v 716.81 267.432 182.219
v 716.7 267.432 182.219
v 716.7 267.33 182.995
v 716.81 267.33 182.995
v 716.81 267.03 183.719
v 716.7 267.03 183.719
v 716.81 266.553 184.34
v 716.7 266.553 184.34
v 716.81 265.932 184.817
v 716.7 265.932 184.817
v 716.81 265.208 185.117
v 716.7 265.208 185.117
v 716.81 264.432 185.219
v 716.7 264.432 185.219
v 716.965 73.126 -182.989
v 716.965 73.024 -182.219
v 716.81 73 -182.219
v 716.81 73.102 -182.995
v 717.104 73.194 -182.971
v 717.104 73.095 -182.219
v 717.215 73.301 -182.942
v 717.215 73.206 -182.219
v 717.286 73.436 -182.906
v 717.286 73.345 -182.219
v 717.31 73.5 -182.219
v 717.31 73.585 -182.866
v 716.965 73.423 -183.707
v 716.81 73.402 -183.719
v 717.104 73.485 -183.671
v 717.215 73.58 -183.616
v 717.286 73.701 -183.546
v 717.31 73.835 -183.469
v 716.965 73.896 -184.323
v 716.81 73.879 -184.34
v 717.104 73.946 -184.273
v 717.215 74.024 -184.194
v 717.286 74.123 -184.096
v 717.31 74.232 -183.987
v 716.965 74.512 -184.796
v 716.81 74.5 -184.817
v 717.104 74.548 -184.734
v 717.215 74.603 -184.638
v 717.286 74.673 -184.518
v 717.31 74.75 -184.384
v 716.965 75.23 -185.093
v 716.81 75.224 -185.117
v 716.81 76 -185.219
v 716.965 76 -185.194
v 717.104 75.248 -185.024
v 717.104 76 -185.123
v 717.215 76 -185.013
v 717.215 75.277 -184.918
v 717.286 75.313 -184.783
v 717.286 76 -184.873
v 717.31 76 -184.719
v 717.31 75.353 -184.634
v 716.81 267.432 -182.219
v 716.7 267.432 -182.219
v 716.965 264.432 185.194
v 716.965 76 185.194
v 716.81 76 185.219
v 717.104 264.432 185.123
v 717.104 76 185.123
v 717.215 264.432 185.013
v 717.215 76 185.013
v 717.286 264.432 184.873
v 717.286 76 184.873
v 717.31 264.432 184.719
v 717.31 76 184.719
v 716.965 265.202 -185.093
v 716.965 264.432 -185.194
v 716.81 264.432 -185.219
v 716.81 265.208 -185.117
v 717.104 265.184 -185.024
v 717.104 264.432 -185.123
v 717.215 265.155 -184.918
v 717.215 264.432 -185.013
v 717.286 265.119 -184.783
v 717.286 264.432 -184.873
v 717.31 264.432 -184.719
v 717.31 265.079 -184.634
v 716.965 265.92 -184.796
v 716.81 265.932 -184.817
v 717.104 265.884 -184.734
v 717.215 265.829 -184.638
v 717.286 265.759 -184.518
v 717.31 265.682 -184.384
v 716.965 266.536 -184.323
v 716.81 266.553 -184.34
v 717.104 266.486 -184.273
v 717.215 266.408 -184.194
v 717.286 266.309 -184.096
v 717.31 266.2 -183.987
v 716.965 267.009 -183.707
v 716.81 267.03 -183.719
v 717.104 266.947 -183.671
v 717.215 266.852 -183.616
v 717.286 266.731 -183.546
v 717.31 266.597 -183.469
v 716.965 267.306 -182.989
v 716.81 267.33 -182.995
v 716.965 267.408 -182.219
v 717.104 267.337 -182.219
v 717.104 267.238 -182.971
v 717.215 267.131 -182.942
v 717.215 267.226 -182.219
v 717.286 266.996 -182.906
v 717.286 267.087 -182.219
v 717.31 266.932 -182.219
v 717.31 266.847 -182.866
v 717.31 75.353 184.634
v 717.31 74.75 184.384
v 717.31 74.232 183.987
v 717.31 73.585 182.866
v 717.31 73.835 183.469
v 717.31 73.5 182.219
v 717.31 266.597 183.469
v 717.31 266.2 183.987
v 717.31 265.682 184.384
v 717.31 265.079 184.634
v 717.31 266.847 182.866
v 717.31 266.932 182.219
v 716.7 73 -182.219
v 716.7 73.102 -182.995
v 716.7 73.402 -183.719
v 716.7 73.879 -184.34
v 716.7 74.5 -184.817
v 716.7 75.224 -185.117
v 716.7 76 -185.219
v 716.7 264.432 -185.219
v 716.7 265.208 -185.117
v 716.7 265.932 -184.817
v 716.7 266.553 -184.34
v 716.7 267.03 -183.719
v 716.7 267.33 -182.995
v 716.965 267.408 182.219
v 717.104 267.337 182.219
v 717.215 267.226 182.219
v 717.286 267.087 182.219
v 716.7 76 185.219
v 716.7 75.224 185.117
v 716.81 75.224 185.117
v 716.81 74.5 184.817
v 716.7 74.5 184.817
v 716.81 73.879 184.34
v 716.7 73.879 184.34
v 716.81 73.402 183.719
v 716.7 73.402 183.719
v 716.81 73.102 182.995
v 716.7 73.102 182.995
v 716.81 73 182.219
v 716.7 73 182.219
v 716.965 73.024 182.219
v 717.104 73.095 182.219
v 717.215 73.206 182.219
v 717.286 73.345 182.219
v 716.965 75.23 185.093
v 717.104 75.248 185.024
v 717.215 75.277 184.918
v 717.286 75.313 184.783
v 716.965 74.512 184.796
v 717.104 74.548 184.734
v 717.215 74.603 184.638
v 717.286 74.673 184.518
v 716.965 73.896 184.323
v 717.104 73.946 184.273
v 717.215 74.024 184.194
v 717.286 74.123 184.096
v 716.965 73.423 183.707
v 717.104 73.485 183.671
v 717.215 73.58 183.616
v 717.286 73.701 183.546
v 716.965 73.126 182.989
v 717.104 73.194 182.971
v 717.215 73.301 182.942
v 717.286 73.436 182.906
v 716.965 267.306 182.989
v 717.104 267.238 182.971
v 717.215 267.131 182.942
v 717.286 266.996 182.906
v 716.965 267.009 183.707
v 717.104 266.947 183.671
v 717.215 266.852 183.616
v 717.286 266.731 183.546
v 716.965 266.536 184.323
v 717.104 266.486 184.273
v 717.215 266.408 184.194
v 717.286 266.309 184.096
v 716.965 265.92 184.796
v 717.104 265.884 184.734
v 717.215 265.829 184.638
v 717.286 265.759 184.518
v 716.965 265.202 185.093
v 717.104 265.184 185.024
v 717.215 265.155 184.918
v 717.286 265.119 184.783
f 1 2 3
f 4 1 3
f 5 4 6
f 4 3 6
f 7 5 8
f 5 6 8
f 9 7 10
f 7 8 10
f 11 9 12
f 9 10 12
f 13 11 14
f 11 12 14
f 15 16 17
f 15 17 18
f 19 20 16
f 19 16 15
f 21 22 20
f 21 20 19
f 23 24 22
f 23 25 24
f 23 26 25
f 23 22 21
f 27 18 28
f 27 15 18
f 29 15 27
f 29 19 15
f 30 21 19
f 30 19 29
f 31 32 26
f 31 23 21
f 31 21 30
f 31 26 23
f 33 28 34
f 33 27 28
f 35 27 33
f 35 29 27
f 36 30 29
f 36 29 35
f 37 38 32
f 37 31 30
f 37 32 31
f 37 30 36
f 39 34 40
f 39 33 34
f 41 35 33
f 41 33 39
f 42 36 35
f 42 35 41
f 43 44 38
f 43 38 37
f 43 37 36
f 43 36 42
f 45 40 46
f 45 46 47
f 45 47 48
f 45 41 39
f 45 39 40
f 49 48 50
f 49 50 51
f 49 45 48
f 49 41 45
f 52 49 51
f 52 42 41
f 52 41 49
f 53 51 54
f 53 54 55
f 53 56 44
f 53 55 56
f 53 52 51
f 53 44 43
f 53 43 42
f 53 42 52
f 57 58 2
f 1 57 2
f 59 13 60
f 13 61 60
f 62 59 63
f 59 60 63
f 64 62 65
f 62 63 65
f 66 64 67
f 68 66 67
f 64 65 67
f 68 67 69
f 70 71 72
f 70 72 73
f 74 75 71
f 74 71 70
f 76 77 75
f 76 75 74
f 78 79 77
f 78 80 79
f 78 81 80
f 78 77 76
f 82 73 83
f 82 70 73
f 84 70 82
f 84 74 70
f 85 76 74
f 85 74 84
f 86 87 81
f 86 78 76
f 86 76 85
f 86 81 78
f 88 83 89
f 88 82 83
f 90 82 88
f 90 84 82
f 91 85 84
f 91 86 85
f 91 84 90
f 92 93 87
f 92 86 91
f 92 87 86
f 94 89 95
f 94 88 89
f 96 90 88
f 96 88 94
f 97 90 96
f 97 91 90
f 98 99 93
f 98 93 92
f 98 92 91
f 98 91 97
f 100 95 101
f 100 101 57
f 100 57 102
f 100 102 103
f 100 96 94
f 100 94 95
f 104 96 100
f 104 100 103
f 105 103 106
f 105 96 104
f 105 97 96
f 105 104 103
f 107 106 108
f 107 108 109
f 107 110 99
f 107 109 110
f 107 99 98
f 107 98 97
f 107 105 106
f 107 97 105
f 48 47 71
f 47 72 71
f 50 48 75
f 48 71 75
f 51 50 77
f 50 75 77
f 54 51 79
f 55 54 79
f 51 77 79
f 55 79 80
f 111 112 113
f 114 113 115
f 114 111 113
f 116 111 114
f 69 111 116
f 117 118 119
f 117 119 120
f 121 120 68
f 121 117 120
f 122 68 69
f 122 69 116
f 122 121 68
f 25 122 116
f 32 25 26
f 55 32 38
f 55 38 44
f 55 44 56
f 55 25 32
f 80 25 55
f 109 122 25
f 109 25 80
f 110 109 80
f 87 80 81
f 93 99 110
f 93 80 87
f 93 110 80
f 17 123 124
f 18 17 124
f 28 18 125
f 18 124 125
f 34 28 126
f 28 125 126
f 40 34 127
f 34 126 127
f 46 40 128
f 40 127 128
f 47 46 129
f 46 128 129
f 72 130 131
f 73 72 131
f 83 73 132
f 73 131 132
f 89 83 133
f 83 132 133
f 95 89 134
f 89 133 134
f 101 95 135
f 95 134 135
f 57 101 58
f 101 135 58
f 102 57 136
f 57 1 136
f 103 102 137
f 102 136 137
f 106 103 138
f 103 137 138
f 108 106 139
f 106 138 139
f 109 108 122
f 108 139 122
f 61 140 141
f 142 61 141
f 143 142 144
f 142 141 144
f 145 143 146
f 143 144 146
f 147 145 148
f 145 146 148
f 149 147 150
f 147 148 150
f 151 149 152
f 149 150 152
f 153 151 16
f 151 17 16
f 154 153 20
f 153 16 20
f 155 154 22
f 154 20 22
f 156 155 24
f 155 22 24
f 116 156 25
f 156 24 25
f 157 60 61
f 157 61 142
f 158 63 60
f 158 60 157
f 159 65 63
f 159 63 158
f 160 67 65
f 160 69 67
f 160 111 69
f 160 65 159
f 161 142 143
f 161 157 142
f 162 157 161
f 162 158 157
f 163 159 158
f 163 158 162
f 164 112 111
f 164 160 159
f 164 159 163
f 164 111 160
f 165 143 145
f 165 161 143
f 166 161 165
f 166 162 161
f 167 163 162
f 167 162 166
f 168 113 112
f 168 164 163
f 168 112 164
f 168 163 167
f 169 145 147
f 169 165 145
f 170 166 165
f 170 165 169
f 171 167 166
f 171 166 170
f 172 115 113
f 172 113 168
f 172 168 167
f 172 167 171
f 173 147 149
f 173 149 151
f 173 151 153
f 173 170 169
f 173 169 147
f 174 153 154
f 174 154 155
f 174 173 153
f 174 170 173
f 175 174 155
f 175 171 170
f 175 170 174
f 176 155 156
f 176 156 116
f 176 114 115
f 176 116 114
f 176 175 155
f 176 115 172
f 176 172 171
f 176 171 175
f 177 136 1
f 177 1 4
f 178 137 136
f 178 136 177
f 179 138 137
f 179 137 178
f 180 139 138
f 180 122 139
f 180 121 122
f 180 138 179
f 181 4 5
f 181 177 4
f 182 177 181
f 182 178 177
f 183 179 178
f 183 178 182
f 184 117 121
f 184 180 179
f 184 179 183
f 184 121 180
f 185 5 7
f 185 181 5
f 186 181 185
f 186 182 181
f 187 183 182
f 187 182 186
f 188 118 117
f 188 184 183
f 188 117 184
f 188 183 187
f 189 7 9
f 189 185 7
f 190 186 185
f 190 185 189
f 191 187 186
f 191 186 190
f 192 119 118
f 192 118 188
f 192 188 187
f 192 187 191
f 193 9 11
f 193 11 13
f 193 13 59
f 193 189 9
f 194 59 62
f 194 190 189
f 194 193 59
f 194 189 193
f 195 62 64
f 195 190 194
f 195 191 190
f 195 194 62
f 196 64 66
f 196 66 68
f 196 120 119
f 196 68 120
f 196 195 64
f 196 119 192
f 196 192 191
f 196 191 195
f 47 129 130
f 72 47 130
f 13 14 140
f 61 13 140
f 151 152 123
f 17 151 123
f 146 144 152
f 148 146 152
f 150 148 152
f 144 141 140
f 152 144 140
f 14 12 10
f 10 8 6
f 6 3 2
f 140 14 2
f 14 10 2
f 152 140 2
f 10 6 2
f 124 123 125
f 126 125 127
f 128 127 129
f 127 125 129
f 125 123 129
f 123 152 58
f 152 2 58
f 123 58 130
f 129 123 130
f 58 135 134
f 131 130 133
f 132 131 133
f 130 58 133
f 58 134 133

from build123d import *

# Parameters (mm, degrees)
BOSS_EXTRUDE1_DEPTH = 0.61
FILLET1_R           = 0.5


with BuildPart() as part:
    # Sketch1 → Boss-Extrude1 (new body)
    with BuildSketch(Plane(origin=(716.7, 0, 0), x_dir=(0, 0, -1), z_dir=(1, 0, 0))):
        with BuildLine():
            Line((185.218894284, 76), (185.218894284, 264.432))
            ThreePointArc((185.218894284, 264.432), (184.340214627, 266.553320344), (182.218894284, 267.432))
            Line((182.218894284, 267.432), (0, 267.432))
            Line((0, 267.432), (-182.218894284, 267.432))
            ThreePointArc((-182.218894284, 267.432), (-184.340214627, 266.553320344), (-185.218894284, 264.432))
            Line((-185.218894284, 264.432), (-185.218894284, 76))
            ThreePointArc((-185.218894284, 76), (-184.340214627, 73.878679656), (-182.218894284, 73))
            Line((-182.218894284, 73), (0, 73))
            Line((0, 73), (182.218894284, 73))
            ThreePointArc((182.218894284, 73), (184.340214627, 73.878679656), (185.218894284, 76))
        make_face()
    extrude(amount=BOSS_EXTRUDE1_DEPTH)

    # Fillet1
    fillet1_edges = [part.edges().sort_by_distance(p)[0] for p in [
        (717.31, 266.553320344, -184.340214627),
        (717.31, 267.432, 0),
        (717.31, 266.553320344, 184.340214627),
        (717.31, 170.216, 185.218894284),
        (717.31, 73.878679656, 184.340214627),
        (717.31, 73, 0),
        (717.31, 73.878679656, -184.340214627),
        (717.31, 170.216, -185.218894284),
    ]]
    fillet(fillet1_edges, radius=FILLET1_R)


solid = part.part
